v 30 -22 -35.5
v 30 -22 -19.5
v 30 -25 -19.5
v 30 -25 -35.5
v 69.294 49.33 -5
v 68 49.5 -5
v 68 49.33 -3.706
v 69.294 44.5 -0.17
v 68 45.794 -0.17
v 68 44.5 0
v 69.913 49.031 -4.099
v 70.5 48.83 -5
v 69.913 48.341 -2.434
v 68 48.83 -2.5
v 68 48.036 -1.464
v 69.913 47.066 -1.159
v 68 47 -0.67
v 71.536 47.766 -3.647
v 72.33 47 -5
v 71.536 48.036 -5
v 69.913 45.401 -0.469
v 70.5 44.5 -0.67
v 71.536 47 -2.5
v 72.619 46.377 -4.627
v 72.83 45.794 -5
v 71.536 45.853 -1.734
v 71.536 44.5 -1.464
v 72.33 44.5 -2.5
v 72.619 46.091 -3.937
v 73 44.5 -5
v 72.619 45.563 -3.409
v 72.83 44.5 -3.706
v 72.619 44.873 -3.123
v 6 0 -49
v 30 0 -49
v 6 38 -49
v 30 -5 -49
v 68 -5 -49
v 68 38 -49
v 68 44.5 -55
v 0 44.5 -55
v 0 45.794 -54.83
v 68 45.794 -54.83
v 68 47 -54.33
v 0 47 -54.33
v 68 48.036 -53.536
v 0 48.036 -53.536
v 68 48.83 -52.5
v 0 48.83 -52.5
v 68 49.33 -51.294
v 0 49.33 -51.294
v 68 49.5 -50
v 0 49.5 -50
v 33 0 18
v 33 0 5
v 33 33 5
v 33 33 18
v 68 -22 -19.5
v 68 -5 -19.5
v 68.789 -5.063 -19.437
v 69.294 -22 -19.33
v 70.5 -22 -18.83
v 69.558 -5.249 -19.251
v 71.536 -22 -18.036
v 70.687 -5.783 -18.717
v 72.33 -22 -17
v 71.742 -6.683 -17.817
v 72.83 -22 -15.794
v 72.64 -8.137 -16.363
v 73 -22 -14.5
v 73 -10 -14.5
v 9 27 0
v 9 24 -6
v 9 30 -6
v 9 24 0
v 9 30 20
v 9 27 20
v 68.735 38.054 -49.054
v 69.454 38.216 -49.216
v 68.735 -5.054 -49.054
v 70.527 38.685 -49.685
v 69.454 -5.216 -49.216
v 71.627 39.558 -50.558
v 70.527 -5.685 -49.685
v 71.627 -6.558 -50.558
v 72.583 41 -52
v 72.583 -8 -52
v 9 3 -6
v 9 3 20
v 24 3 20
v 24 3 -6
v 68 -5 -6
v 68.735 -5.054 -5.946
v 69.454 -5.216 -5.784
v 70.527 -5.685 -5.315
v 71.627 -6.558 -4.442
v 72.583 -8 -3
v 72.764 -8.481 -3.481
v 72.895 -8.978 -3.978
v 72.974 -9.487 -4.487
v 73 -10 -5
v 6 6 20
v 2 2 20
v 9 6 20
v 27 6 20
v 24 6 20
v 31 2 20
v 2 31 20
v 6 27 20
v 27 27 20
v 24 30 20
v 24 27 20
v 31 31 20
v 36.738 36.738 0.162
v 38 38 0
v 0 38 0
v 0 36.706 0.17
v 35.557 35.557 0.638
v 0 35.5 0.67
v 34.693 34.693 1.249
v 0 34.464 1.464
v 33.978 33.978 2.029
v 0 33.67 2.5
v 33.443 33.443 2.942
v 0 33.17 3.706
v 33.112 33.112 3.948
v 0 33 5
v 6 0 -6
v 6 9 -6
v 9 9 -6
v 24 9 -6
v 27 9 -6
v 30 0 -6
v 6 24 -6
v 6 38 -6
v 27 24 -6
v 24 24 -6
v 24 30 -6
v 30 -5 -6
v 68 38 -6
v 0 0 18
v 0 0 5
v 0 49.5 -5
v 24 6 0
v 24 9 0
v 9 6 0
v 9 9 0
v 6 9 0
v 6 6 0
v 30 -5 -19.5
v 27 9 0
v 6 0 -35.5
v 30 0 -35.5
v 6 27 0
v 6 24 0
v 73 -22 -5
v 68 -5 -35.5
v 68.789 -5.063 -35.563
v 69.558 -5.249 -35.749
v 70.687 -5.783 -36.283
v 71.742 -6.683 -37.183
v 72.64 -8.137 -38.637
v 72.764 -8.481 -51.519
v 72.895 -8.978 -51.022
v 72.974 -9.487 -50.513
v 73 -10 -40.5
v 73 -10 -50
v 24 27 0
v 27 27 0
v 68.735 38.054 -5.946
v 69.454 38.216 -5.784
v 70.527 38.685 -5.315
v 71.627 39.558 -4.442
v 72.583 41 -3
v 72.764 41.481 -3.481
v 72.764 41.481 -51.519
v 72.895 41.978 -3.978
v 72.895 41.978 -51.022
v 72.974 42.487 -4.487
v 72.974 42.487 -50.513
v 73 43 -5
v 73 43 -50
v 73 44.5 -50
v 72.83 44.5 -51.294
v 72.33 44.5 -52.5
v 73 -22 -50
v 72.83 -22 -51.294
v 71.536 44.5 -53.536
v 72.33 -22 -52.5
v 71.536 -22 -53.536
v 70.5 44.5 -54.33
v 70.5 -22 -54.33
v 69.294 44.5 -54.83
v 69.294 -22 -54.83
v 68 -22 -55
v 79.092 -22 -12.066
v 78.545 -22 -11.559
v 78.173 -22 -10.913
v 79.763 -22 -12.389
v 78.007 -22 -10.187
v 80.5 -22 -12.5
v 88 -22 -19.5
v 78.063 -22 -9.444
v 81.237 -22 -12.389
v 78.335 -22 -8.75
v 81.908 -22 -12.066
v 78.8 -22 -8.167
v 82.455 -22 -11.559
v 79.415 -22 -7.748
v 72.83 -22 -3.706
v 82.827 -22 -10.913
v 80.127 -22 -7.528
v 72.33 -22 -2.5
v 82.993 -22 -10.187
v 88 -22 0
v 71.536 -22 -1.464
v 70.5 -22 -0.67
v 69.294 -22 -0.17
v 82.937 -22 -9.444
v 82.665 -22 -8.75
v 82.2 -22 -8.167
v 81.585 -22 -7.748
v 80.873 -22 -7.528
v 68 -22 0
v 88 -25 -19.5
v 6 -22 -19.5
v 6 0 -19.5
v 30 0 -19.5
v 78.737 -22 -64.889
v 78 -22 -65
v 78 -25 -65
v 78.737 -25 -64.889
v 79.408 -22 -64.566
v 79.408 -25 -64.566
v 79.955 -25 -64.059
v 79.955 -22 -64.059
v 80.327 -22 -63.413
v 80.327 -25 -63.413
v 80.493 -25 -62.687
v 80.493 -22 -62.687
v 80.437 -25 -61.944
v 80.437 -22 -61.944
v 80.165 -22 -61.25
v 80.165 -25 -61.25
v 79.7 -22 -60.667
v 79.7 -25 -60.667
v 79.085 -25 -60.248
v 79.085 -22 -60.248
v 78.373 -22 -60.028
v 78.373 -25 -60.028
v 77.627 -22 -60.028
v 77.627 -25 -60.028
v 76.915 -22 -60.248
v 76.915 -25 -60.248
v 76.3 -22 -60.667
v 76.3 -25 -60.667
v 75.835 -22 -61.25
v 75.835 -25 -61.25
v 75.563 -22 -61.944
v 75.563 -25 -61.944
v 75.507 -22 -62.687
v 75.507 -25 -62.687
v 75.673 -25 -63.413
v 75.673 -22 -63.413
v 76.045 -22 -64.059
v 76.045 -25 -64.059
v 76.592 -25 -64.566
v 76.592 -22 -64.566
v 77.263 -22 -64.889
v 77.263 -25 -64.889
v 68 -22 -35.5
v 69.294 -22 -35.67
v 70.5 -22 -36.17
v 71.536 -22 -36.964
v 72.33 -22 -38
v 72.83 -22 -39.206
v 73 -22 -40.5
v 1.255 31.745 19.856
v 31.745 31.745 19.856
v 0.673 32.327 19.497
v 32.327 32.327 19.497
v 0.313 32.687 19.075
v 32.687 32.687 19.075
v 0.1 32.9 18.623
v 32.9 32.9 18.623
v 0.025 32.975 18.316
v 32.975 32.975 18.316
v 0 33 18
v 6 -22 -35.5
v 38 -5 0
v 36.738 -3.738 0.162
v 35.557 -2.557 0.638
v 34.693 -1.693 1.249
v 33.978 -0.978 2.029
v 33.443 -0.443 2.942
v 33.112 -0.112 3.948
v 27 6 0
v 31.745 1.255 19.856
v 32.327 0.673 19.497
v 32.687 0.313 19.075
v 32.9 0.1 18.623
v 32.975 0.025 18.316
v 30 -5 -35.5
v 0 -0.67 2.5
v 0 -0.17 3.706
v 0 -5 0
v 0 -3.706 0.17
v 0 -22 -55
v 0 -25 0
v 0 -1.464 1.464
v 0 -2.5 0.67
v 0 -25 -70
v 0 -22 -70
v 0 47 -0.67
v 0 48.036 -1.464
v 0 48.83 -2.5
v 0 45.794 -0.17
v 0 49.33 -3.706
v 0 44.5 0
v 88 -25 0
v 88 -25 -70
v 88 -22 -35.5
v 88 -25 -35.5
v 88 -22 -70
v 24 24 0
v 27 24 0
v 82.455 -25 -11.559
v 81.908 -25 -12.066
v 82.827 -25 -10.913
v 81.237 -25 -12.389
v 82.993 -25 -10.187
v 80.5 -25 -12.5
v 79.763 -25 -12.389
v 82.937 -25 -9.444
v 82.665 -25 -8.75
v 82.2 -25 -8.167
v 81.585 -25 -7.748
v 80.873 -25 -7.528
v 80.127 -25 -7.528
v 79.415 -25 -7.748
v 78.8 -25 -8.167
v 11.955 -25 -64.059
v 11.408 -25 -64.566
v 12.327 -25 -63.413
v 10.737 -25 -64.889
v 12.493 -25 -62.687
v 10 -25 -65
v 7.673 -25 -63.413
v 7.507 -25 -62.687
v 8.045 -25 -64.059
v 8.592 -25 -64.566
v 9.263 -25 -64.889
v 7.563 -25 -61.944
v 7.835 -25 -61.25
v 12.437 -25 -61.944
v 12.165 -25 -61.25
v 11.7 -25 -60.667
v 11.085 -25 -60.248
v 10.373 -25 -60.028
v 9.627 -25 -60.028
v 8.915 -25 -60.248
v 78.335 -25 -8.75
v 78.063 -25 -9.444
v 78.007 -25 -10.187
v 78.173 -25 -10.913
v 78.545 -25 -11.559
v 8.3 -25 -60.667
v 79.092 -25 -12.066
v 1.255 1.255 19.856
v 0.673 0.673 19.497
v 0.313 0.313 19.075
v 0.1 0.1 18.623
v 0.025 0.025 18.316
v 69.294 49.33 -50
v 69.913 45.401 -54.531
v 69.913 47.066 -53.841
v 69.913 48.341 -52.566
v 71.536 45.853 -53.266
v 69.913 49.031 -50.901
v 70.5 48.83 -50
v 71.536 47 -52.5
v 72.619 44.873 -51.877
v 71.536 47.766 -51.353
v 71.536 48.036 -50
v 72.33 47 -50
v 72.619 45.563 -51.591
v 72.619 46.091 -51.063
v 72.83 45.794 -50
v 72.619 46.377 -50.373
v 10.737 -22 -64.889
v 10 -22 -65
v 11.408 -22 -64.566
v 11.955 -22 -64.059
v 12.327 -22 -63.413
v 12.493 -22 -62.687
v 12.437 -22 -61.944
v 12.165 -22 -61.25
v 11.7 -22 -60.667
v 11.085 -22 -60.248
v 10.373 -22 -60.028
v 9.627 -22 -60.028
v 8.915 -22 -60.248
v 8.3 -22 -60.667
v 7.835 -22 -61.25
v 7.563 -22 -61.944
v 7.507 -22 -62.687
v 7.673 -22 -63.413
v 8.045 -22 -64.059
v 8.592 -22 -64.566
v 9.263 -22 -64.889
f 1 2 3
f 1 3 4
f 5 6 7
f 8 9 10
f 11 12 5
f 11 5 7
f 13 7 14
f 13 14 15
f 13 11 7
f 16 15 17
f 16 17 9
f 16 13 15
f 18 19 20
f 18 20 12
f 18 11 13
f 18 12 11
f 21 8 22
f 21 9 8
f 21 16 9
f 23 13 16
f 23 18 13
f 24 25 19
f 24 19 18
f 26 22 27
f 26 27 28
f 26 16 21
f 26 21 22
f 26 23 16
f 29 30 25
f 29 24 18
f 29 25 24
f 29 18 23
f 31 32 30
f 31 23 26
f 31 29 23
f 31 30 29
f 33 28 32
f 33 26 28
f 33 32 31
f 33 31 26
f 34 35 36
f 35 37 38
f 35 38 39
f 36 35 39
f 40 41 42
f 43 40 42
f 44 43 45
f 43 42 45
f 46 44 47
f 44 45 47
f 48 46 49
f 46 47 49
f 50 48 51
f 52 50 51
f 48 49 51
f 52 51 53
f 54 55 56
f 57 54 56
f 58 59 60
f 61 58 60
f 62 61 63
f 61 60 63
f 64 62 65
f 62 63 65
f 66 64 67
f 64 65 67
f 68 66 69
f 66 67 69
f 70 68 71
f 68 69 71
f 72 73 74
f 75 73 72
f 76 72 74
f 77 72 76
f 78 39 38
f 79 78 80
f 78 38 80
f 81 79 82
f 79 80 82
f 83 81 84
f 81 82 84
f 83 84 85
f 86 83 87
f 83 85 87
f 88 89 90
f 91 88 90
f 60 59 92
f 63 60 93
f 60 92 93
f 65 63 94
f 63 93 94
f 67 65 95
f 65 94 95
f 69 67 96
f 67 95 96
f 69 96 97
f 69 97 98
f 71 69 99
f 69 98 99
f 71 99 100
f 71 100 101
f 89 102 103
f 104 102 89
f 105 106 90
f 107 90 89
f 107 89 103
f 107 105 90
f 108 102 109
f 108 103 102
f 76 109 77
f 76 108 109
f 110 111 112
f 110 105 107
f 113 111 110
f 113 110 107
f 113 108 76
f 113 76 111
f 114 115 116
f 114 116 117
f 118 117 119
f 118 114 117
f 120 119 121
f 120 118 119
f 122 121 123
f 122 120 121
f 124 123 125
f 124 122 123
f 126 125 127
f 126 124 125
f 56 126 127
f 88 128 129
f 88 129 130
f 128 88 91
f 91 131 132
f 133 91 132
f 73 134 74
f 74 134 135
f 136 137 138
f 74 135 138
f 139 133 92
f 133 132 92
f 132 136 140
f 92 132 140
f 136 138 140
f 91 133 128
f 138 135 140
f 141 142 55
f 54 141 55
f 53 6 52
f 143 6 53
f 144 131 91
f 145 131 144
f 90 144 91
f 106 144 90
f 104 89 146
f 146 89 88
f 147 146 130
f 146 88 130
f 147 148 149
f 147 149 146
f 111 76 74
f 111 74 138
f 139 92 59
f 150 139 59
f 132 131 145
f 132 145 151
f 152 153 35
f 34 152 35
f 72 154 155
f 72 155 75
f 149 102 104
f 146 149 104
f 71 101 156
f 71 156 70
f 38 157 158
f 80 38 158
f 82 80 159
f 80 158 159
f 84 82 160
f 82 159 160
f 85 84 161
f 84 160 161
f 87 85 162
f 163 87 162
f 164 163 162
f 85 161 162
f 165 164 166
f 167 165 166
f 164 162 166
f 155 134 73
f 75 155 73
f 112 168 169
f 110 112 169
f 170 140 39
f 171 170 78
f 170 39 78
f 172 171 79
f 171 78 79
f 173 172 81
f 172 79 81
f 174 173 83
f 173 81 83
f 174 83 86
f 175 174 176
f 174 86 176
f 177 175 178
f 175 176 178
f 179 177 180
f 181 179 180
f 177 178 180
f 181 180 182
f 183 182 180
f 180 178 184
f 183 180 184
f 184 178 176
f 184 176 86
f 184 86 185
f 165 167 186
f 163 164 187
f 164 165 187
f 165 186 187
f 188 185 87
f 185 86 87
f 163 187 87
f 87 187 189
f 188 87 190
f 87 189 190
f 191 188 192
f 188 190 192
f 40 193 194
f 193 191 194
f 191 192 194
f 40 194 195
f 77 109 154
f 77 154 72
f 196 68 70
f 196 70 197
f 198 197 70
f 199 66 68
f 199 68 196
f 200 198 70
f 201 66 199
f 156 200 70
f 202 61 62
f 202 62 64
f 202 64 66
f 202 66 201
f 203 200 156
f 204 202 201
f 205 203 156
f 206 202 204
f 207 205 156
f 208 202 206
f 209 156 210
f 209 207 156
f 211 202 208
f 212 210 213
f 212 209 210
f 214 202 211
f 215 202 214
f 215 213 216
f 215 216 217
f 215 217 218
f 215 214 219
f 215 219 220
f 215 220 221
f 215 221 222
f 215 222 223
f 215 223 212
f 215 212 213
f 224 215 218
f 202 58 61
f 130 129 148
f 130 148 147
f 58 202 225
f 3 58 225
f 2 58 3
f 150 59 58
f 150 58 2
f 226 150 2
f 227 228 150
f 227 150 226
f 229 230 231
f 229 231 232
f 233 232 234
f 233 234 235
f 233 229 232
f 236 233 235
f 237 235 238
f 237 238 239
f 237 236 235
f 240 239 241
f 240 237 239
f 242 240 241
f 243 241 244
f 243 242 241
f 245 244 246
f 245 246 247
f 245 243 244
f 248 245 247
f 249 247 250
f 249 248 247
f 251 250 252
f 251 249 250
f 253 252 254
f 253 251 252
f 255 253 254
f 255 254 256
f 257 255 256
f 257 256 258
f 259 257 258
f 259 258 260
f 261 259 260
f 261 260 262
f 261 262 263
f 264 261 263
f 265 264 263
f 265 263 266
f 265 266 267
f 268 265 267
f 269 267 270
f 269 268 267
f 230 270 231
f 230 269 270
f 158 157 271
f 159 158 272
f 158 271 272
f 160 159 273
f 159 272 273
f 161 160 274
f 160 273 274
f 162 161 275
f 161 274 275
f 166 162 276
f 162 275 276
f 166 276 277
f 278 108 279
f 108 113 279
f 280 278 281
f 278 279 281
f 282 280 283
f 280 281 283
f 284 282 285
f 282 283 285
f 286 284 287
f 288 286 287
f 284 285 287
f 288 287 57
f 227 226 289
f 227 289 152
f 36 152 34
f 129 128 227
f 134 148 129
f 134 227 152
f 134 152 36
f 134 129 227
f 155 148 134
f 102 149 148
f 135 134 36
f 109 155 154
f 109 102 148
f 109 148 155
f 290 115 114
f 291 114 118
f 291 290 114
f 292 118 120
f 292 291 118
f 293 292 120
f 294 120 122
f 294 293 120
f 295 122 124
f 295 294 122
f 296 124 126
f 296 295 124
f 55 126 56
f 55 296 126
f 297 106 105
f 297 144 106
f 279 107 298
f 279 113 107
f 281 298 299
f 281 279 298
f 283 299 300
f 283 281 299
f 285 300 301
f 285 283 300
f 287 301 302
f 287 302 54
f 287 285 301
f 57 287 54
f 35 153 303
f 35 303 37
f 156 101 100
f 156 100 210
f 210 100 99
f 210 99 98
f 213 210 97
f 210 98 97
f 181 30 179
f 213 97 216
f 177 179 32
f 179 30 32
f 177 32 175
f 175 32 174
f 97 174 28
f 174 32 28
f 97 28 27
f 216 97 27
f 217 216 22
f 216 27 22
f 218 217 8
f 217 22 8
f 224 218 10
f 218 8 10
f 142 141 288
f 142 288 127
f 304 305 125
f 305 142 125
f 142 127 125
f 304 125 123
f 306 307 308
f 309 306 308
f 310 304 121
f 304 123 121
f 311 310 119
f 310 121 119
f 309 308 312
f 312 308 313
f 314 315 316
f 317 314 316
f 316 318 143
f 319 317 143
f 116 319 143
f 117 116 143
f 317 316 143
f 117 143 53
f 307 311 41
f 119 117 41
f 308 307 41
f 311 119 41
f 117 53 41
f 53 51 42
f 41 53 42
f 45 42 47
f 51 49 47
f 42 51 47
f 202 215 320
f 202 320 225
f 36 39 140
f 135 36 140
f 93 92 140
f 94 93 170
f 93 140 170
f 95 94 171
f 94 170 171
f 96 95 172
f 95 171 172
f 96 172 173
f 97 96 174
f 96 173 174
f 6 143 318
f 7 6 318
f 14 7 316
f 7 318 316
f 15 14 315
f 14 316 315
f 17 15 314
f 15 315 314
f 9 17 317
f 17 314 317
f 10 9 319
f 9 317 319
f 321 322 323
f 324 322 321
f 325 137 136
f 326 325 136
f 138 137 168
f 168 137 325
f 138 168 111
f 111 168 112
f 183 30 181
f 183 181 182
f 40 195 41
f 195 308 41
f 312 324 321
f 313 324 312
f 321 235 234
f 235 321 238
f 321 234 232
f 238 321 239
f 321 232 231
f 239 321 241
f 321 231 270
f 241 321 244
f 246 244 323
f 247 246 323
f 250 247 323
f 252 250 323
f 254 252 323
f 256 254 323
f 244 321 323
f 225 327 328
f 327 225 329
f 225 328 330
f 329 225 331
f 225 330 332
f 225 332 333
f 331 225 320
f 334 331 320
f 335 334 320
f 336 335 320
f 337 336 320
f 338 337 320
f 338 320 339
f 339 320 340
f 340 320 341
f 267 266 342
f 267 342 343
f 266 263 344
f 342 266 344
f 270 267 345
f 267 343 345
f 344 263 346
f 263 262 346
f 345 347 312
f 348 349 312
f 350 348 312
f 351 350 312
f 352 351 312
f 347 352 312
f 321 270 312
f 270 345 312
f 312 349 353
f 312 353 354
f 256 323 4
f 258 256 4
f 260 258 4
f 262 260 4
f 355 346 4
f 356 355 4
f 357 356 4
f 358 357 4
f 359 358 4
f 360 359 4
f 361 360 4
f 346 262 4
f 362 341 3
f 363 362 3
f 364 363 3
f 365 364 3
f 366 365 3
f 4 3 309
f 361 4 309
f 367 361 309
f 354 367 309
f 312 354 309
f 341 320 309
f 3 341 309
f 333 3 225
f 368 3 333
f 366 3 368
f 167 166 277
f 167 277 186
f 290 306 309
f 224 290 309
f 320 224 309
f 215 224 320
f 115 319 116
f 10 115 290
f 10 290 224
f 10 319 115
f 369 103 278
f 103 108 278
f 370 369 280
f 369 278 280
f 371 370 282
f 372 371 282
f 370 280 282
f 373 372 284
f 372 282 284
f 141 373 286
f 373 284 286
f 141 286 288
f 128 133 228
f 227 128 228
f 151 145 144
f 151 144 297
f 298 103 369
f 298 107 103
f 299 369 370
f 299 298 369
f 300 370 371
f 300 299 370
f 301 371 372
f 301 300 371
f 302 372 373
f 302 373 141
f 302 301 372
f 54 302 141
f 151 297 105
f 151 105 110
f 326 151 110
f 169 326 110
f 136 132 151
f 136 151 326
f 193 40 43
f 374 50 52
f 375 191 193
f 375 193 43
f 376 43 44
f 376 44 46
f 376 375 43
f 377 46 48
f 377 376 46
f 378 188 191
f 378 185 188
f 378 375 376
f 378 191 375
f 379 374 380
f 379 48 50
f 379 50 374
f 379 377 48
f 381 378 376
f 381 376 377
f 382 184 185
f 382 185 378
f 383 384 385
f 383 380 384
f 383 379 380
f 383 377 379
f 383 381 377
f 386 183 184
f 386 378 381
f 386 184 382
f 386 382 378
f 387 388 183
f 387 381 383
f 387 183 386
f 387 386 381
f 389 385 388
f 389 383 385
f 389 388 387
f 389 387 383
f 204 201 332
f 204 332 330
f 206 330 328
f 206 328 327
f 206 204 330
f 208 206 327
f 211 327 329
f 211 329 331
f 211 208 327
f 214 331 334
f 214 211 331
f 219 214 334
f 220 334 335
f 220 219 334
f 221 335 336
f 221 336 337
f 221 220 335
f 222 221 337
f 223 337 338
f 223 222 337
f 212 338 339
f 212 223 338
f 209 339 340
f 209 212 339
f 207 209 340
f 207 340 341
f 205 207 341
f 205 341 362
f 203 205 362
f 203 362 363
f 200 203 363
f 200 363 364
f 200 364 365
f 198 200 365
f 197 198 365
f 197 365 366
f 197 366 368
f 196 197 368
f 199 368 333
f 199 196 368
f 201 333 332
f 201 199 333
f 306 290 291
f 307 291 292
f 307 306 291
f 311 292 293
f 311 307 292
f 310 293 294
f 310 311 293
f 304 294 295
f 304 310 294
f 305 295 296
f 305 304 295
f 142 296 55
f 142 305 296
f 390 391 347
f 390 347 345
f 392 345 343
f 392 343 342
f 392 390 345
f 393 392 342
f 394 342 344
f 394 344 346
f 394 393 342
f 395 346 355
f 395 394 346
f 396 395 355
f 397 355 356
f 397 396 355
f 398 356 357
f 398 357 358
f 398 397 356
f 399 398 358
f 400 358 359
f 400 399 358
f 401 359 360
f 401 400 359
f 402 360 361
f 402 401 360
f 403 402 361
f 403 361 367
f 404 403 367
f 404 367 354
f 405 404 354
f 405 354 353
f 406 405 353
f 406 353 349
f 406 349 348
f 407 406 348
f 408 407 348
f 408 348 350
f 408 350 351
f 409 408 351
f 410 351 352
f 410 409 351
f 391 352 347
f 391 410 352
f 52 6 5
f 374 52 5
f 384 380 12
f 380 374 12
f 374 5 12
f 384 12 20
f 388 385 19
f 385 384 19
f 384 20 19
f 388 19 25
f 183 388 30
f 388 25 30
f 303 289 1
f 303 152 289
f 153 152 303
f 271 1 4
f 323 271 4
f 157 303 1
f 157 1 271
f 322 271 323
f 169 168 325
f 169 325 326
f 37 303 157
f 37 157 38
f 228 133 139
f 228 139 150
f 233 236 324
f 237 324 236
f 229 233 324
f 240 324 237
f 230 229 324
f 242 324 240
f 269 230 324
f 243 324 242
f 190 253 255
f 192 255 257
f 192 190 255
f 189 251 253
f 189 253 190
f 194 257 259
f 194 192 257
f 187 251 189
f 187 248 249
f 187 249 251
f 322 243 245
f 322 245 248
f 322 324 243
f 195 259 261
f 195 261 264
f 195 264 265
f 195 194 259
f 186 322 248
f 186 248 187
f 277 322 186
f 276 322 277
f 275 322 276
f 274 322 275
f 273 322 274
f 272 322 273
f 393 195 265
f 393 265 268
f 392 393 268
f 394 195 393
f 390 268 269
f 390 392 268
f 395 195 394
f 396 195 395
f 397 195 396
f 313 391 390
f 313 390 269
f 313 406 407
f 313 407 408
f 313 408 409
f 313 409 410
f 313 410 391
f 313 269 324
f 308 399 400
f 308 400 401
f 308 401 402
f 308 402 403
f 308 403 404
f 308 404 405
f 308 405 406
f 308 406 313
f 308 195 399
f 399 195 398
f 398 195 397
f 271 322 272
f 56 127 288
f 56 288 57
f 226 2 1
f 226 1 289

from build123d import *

# Parameters (mm, degrees)
SKETCH1_W           = 33
SKETCH1_H           = 33
BOSS_EXTRUDE1_DEPTH = 20
SHELL1_T            = -6
SKETCH2_W           = 73
SKETCH2_H           = 71.5
BOSS_EXTRUDE2_DEPTH = 55
SKETCH7_W           = 15
SKETCH7_H           = 50
CUT_EXTRUDE2_DEPTH  = 3
SKETCH9_W           = 21
SKETCH9_H           = 21
CUT_EXTRUDE5_DEPTH  = 45
SKETCH16_W          = 55
SKETCH16_H          = 55
BOSS_EXTRUDE5_DEPTH = 40
CUT_EXTRUDE14_REACH = 105.943
BOSS_EXTRUDE6_START = -26
SKETCH23_W          = 3
SKETCH23_H          = 3
BOSS_EXTRUDE6_DEPTH = 6
BOSS_EXTRUDE7_REACH = 148.943
BOSS_EXTRUDE7_START = -43
SKETCH24_W          = 13.5
SKETCH24_H          = 5
SKETCH25_R          = 2.5
BOSS_EXTRUDE8_DEPTH = 3
FILLET1_R           = 5
FILLET2_R           = 2


with BuildPart() as part:
    # Sketch1 → Boss-Extrude1 (new body)
    with BuildSketch(Plane.XY):
        with Locations((16.5, 16.5)):
            Rectangle(SKETCH1_W, SKETCH1_H)
    extrude(amount=BOSS_EXTRUDE1_DEPTH)

    # Shell1
    shell1_openings = [part.faces().sort_by_distance(p)[0] for p in [
        (16.5, 16.5, 20),
    ]]
    offset(amount=SHELL1_T, openings=shell1_openings, kind=Kind.INTERSECTION)

    # Sketch2 → Boss-Extrude2 (add)
    with BuildSketch(Plane(origin=(0, 0, 0), x_dir=(-1, 0, 0), z_dir=(0, 0, -1))):
        with Locations((-36.5, 13.75)):
            Rectangle(SKETCH2_W, SKETCH2_H)
    extrude(amount=BOSS_EXTRUDE2_DEPTH)

    # Sketch7 → Cut-Extrude2 (cut)
    with BuildSketch(Plane.XZ.offset(-27)):
        with Locations((16.5, -5)):
            Rectangle(SKETCH7_W, SKETCH7_H)
    cut_extrude2 = extrude(amount=-CUT_EXTRUDE2_DEPTH, mode=Mode.SUBTRACT)

    # Sketch9 → Cut-Extrude5 (cut)
    with BuildSketch(Plane.XY.offset(6)):
        with Locations((16.5, 16.5)):
            Rectangle(SKETCH9_W, SKETCH9_H)
    extrude(amount=-CUT_EXTRUDE5_DEPTH, mode=Mode.SUBTRACT)

    # Mirror2: Cut-Extrude2 across plane
    add(cut_extrude2.mirror(Plane(origin=(0, 16.5, 0), x_dir=(0, 0, 1), z_dir=(0, -1, 0))), mode=Mode.SUBTRACT)

    # Sketch16 → Boss-Extrude5 (add)
    with BuildSketch(Plane(origin=(33, 0, 0), x_dir=(0, 0, -1), z_dir=(1, 0, 0))):
        with Locations((27.5, 16.5)):
            Rectangle(SKETCH16_W, SKETCH16_H)
    extrude(amount=BOSS_EXTRUDE5_DEPTH)

    # Cut-Extrude14: up to this face of the body (flat: up to its plane)
    cut_extrude14_end = Plane(part.part.faces().sort_by_distance((6, 16.5, -9.5))[0])
    # Sketch22 → Cut-Extrude14 (cut, up to the picked face)
    with BuildSketch(Plane(origin=(73, 0, 0), x_dir=(0, 0, -1), z_dir=(1, 0, 0)), mode=Mode.PRIVATE) as cut_extrude14_sk1:
        Polygon((6, -5), (19.5, -5), (19.5, -22), (35.5, -22), (35.5, -5), (49, -5), (49, 38), (6, 38), align=None)
    cut_extrude14_tool1 = split(extrude(cut_extrude14_sk1.sketch, amount=-CUT_EXTRUDE14_REACH, mode=Mode.PRIVATE), bisect_by=cut_extrude14_end, keep=Keep.BOTH, mode=Mode.PRIVATE)
    add(cut_extrude14_tool1.solids().sort_by(Axis((73, 12.652758, -27.5), (-1, 0, 0)))[0], mode=Mode.SUBTRACT)

    # Sketch23 → Boss-Extrude6 (add)
    with BuildSketch(Plane.XY.offset(20).offset(BOSS_EXTRUDE6_START)):
        with Locations((7.5, 7.5)):
            Rectangle(SKETCH23_W, SKETCH23_H)
        with Locations((7.5, 25.5)):
            Rectangle(SKETCH23_W, SKETCH23_H)
        with Locations((25.5, 25.5)):
            Rectangle(SKETCH23_W, SKETCH23_H)
        with Locations((25.5, 7.5)):
            Rectangle(SKETCH23_W, SKETCH23_H)
    extrude(amount=BOSS_EXTRUDE6_DEPTH)

    # Sketch24 → Boss-Extrude7 (add, up to next)
    with BuildSketch(Plane(origin=(73, 0, 0), x_dir=(0, 0, -1), z_dir=(1, 0, 0)).offset(BOSS_EXTRUDE7_START), mode=Mode.PRIVATE) as boss_extrude7_sk1:
        with Locations((12.75, -2.5)):
            Rectangle(SKETCH24_W, SKETCH24_H)
    boss_extrude7_tool1 = extrude(boss_extrude7_sk1.sketch, amount=-BOSS_EXTRUDE7_REACH, mode=Mode.PRIVATE) - part.part
    # Sketch24 → Boss-Extrude7 (add, up to next)
    with BuildSketch(Plane(origin=(73, 0, 0), x_dir=(0, 0, -1), z_dir=(1, 0, 0)).offset(BOSS_EXTRUDE7_START), mode=Mode.PRIVATE) as boss_extrude7_sk2:
        with Locations((42.25, -2.5)):
            Rectangle(SKETCH24_W, SKETCH24_H)
    boss_extrude7_tool2 = extrude(boss_extrude7_sk2.sketch, amount=-BOSS_EXTRUDE7_REACH, mode=Mode.PRIVATE) - part.part
    add(boss_extrude7_tool1.solids().sort_by_distance((30, -2.5, -12.75))[0])
    add(boss_extrude7_tool2.solids().sort_by_distance((30, -2.5, -42.25))[0])

    # Sketch25 → Boss-Extrude8 (add)
    with BuildSketch(Plane.XZ.offset(22)):
        Polygon((0, 0), (88, 0), (88, -19.5), (30, -19.5), (30, -35.5), (88, -35.5), (88, -70), (0, -70), align=None)
        with Locations(Location((10, -62.5, 0), (0, 0, 270))):
            Circle(SKETCH25_R, mode=Mode.SUBTRACT)
        with Locations(Location((78, -62.5, 0), (0, 0, 270))):
            Circle(SKETCH25_R, mode=Mode.SUBTRACT)
        with Locations(Location((80.5, -10, 0), (0, 0, 270))):
            Circle(SKETCH25_R, mode=Mode.SUBTRACT)
    extrude(amount=BOSS_EXTRUDE8_DEPTH)

    # Fillet1
    # the kernel refuses this fillet: 5 mm, written as the material it adds along each edge
    with BuildSketch(Plane(origin=(33, 33, 0), x_dir=(0, 0, 1), z_dir=(-1, 0, 0)), Plane(origin=(33, 0, 0), x_dir=(0, 0, 1), z_dir=(0, 1, 0)), Plane(origin=(0, 0, 0), x_dir=(0, 0, 1), z_dir=(1, 0, 0))) as fillet1_piece_1:
        with BuildLine():
            CenterArc((FILLET1_R, FILLET1_R), FILLET1_R, 180, 90)
            Line((0, FILLET1_R), (-FILLET1_R * 0.02, FILLET1_R))
            Line((-FILLET1_R * 0.02, FILLET1_R), (-FILLET1_R * 0.02, -FILLET1_R * 0.02))
            Line((-FILLET1_R * 0.02, -FILLET1_R * 0.02), (FILLET1_R, -FILLET1_R * 0.02))
            Line((FILLET1_R, -FILLET1_R * 0.02), (FILLET1_R, 0))
        make_face()
    extrude(amount=33)
    with BuildSketch(Plane(origin=(33, 0, 0), x_dir=(0, 0, 1), z_dir=(0, 1, 0))) as fillet1_piece_2a_section:
        with BuildLine():
            CenterArc((FILLET1_R, FILLET1_R), FILLET1_R, 180, 90)
            Line((0, FILLET1_R), (-FILLET1_R * 0.02, FILLET1_R))
            Line((-FILLET1_R * 0.02, FILLET1_R), (-FILLET1_R * 0.02, -FILLET1_R * 0.02))
            Line((-FILLET1_R * 0.02, -FILLET1_R * 0.02), (FILLET1_R, -FILLET1_R * 0.02))
            Line((FILLET1_R, -FILLET1_R * 0.02), (FILLET1_R, 0))
        make_face()
    fillet1_piece_2a = extrude(amount=45.5, mode=Mode.PRIVATE)
    fillet1_piece_2a = split(fillet1_piece_2a, bisect_by=Plane(origin=(34.131975571, 33, 1.131975571), z_dir=(0, 1, 0)), keep=Keep.TOP, mode=Mode.PRIVATE)
    with BuildSketch(Plane(origin=(45.5, 33, 0), x_dir=(0, 0, 1), z_dir=(-1, 0, 0))) as fillet1_piece_2b_section:
        with BuildLine():
            CenterArc((FILLET1_R, FILLET1_R), FILLET1_R, 180, 90)
            Line((0, FILLET1_R), (-FILLET1_R * 0.02, FILLET1_R))
            Line((-FILLET1_R * 0.02, FILLET1_R), (-FILLET1_R * 0.02, -FILLET1_R * 0.02))
            Line((-FILLET1_R * 0.02, -FILLET1_R * 0.02), (FILLET1_R, -FILLET1_R * 0.02))
            Line((FILLET1_R, -FILLET1_R * 0.02), (FILLET1_R, 0))
        make_face()
    fillet1_piece_2b = extrude(amount=45.5, mode=Mode.PRIVATE)
    fillet1_piece_2b = split(fillet1_piece_2b, bisect_by=Plane(origin=(33, 34.131975571, 1.131975571), z_dir=(1, 0, 0)), keep=Keep.TOP, mode=Mode.PRIVATE)
    fillet1_piece_2 = fillet1_piece_2a & fillet1_piece_2b
    add(fillet1_piece_2)
    with BuildSketch(Plane(origin=(0, 0, 0), x_dir=(0, 0, 1), z_dir=(1, 0, 0))) as fillet1_piece_3a_section:
        with BuildLine():
            CenterArc((FILLET1_R, FILLET1_R), FILLET1_R, 180, 90)
            Line((0, FILLET1_R), (-FILLET1_R * 0.02, FILLET1_R))
            Line((-FILLET1_R * 0.02, FILLET1_R), (-FILLET1_R * 0.02, -FILLET1_R * 0.02))
            Line((-FILLET1_R * 0.02, -FILLET1_R * 0.02), (FILLET1_R, -FILLET1_R * 0.02))
            Line((FILLET1_R, -FILLET1_R * 0.02), (FILLET1_R, 0))
        make_face()
    fillet1_piece_3a = extrude(amount=45.5, mode=Mode.PRIVATE)
    fillet1_piece_3a = split(fillet1_piece_3a, bisect_by=Plane(origin=(33, -1.131975571, 1.131975571), z_dir=(1, 0, 0)), keep=Keep.TOP, mode=Mode.PRIVATE)
    with BuildSketch(Plane(origin=(33, -12.5, 0), x_dir=(0, 0, 1), z_dir=(0, 1, 0))) as fillet1_piece_3b_section:
        with BuildLine():
            CenterArc((FILLET1_R, FILLET1_R), FILLET1_R, 180, 90)
            Line((0, FILLET1_R), (-FILLET1_R * 0.02, FILLET1_R))
            Line((-FILLET1_R * 0.02, FILLET1_R), (-FILLET1_R * 0.02, -FILLET1_R * 0.02))
            Line((-FILLET1_R * 0.02, -FILLET1_R * 0.02), (FILLET1_R, -FILLET1_R * 0.02))
            Line((FILLET1_R, -FILLET1_R * 0.02), (FILLET1_R, 0))
        make_face()
    fillet1_piece_3b = extrude(amount=45.5, mode=Mode.PRIVATE)
    fillet1_piece_3b = split(fillet1_piece_3b, bisect_by=Plane(origin=(34.131975571, 0, 1.131975571), z_dir=(0, -1, 0)), keep=Keep.TOP, mode=Mode.PRIVATE)
    fillet1_piece_3 = fillet1_piece_3a & fillet1_piece_3b
    add(fillet1_piece_3)
    # the kernel refuses this fillet: 5 mm, written as the material it takes off along each edge
    with BuildSketch(Plane(origin=(68, 44.5, -50), x_dir=(0, 1, 0), z_dir=(1, 0, 0))) as fillet1_2_piece_1_section:
        Polygon((0, 0), (FILLET1_R * 1.02, 0), (FILLET1_R * 1.02, -FILLET1_R * 1.02), (0, -FILLET1_R * 1.02), align=None)
    fillet1_2_piece_1 = extrude(amount=FILLET1_R * 1.02, mode=Mode.PRIVATE)
    fillet1_2_piece_1 = fillet1_2_piece_1 - Plane(origin=(68, 44.5, -50), x_dir=(0, -0.7071067811865475, 0.7071067811865475), z_dir=(1, 0, 0)) * Sphere(FILLET1_R, mode=Mode.PRIVATE)
    add(fillet1_2_piece_1, mode=Mode.SUBTRACT)
    with BuildSketch(Plane(origin=(68, 44.5, -5), x_dir=(0, 1, 0), z_dir=(1, 0, 0))) as fillet1_2_piece_2_section:
        Polygon((0, 0), (FILLET1_R * 1.02, 0), (FILLET1_R * 1.02, FILLET1_R * 1.02), (0, FILLET1_R * 1.02), align=None)
    fillet1_2_piece_2 = extrude(amount=FILLET1_R * 1.02, mode=Mode.PRIVATE)
    fillet1_2_piece_2 = fillet1_2_piece_2 - Plane(origin=(68, 44.5, -5), x_dir=(0, -0.7071067811865475, -0.7071067811865475), z_dir=(1, 0, 0)) * Sphere(FILLET1_R, mode=Mode.PRIVATE)
    add(fillet1_2_piece_2, mode=Mode.SUBTRACT)
    with BuildSketch(Plane(origin=(73, -5, -49), x_dir=(0, 0, -1), z_dir=(0, 1, 0)), Plane(origin=(73, 38, -49), x_dir=(0, 1, 0), z_dir=(0, 0, 1)), Plane(origin=(73, 38, -6), x_dir=(0, 0, 1), z_dir=(0, -1, 0))) as fillet1_2_piece_3:
        with BuildLine():
            CenterArc((FILLET1_R, FILLET1_R), FILLET1_R, 180, 90)
            Line((0, FILLET1_R), (-FILLET1_R * 0.02, FILLET1_R))
            Line((-FILLET1_R * 0.02, FILLET1_R), (-FILLET1_R * 0.02, -FILLET1_R * 0.02))
            Line((-FILLET1_R * 0.02, -FILLET1_R * 0.02), (FILLET1_R, -FILLET1_R * 0.02))
            Line((FILLET1_R, -FILLET1_R * 0.02), (FILLET1_R, 0))
        make_face()
    extrude(amount=43, mode=Mode.SUBTRACT)
    with BuildSketch(Plane(origin=(73, -5, -6), x_dir=(0, -1, 0), z_dir=(0, 0, -1)), Plane(origin=(73, -5, -35.5), x_dir=(0, -1, 0), z_dir=(0, 0, -1))) as fillet1_2_piece_4:
        with BuildLine():
            CenterArc((FILLET1_R, FILLET1_R), FILLET1_R, 180, 90)
            Line((0, FILLET1_R), (-FILLET1_R * 0.02, FILLET1_R))
            Line((-FILLET1_R * 0.02, FILLET1_R), (-FILLET1_R * 0.02, -FILLET1_R * 0.02))
            Line((-FILLET1_R * 0.02, -FILLET1_R * 0.02), (FILLET1_R, -FILLET1_R * 0.02))
            Line((FILLET1_R, -FILLET1_R * 0.02), (FILLET1_R, 0))
        make_face()
    extrude(amount=13.5, mode=Mode.SUBTRACT)
    with BuildSketch(Plane(origin=(73, -5, -19.5), x_dir=(0, 0, 1), z_dir=(0, -1, 0)), Plane(origin=(73, -22, -35.5), x_dir=(0, 0, -1), z_dir=(0, 1, 0))) as fillet1_2_piece_5:
        with BuildLine():
            CenterArc((FILLET1_R, FILLET1_R), FILLET1_R, 180, 90)
            Line((0, FILLET1_R), (-FILLET1_R * 0.02, FILLET1_R))
            Line((-FILLET1_R * 0.02, FILLET1_R), (-FILLET1_R * 0.02, -FILLET1_R * 0.02))
            Line((-FILLET1_R * 0.02, -FILLET1_R * 0.02), (FILLET1_R, -FILLET1_R * 0.02))
            Line((FILLET1_R, -FILLET1_R * 0.02), (FILLET1_R, 0))
        make_face()
    extrude(amount=17, mode=Mode.SUBTRACT)
    with BuildSketch(Plane(origin=(0, 49.5, -55), x_dir=(0, 0, 1), z_dir=(1, 0, 0))) as fillet1_2_piece_6:
        with BuildLine():
            CenterArc((FILLET1_R, FILLET1_R), FILLET1_R, 180, 90)
            Line((0, FILLET1_R), (-FILLET1_R * 0.02, FILLET1_R))
            Line((-FILLET1_R * 0.02, FILLET1_R), (-FILLET1_R * 0.02, -FILLET1_R * 0.02))
            Line((-FILLET1_R * 0.02, -FILLET1_R * 0.02), (FILLET1_R, -FILLET1_R * 0.02))
            Line((FILLET1_R, -FILLET1_R * 0.02), (FILLET1_R, 0))
        make_face()
    extrude(amount=68, mode=Mode.SUBTRACT)
    with BuildSketch(Plane(origin=(73, -22, -55), x_dir=(0, 0, 1), z_dir=(0, 1, 0)), Plane(origin=(73, 44.5, 0), x_dir=(0, 0, -1), z_dir=(0, -1, 0))) as fillet1_2_piece_7:
        with BuildLine():
            CenterArc((FILLET1_R, -FILLET1_R), FILLET1_R, 90, 90)
            Line((0, -FILLET1_R), (-FILLET1_R * 0.02, -FILLET1_R))
            Line((-FILLET1_R * 0.02, -FILLET1_R), (-FILLET1_R * 0.02, FILLET1_R * 0.02))
            Line((-FILLET1_R * 0.02, FILLET1_R * 0.02), (FILLET1_R, FILLET1_R * 0.02))
            Line((FILLET1_R, FILLET1_R * 0.02), (FILLET1_R, 0))
        make_face()
    extrude(amount=66.5, mode=Mode.SUBTRACT)
    with BuildSketch(Plane(origin=(73, 49.5, -5), x_dir=(0, -1, 0), z_dir=(0, 0, -1))) as fillet1_2_piece_8:
        with BuildLine():
            CenterArc((FILLET1_R, FILLET1_R), FILLET1_R, 180, 90)
            Line((0, FILLET1_R), (-FILLET1_R * 0.02, FILLET1_R))
            Line((-FILLET1_R * 0.02, FILLET1_R), (-FILLET1_R * 0.02, -FILLET1_R * 0.02))
            Line((-FILLET1_R * 0.02, -FILLET1_R * 0.02), (FILLET1_R, -FILLET1_R * 0.02))
            Line((FILLET1_R, -FILLET1_R * 0.02), (FILLET1_R, 0))
        make_face()
    extrude(amount=45, mode=Mode.SUBTRACT)
    with BuildSketch(Plane(origin=(0, 49.5, 0), x_dir=(0, 0, -1), z_dir=(1, 0, 0))) as fillet1_2_piece_9:
        with BuildLine():
            CenterArc((FILLET1_R, -FILLET1_R), FILLET1_R, 90, 90)
            Line((0, -FILLET1_R), (-FILLET1_R * 0.02, -FILLET1_R))
            Line((-FILLET1_R * 0.02, -FILLET1_R), (-FILLET1_R * 0.02, FILLET1_R * 0.02))
            Line((-FILLET1_R * 0.02, FILLET1_R * 0.02), (FILLET1_R, FILLET1_R * 0.02))
            Line((FILLET1_R, FILLET1_R * 0.02), (FILLET1_R, 0))
        make_face()
    extrude(amount=68, mode=Mode.SUBTRACT)
    with BuildSketch(Plane(origin=(73, -17.5, -49), x_dir=(0, 0, -1), z_dir=(0, 1, 0))) as fillet1_2_piece_10a_section:
        with BuildLine():
            CenterArc((FILLET1_R, FILLET1_R), FILLET1_R, 180, 90)
            Line((0, FILLET1_R), (-FILLET1_R * 0.02, FILLET1_R))
            Line((-FILLET1_R * 0.02, FILLET1_R), (-FILLET1_R * 0.02, -FILLET1_R * 0.02))
            Line((-FILLET1_R * 0.02, -FILLET1_R * 0.02), (FILLET1_R, -FILLET1_R * 0.02))
            Line((FILLET1_R, -FILLET1_R * 0.02), (FILLET1_R, 0))
        make_face()
    fillet1_2_piece_10a = extrude(amount=55.5, mode=Mode.PRIVATE)
    fillet1_2_piece_10a = split(fillet1_2_piece_10a, bisect_by=Plane(origin=(71.868024429, -5, -50.131975571), z_dir=(0, -1, 0)), keep=Keep.TOP, mode=Mode.PRIVATE)
    with BuildSketch(Plane(origin=(73, -5, -35.5), x_dir=(0, -1, 0), z_dir=(0, 0, -1))) as fillet1_2_piece_10b_section:
        with BuildLine():
            CenterArc((FILLET1_R, FILLET1_R), FILLET1_R, 180, 90)
            Line((0, FILLET1_R), (-FILLET1_R * 0.02, FILLET1_R))
            Line((-FILLET1_R * 0.02, FILLET1_R), (-FILLET1_R * 0.02, -FILLET1_R * 0.02))
            Line((-FILLET1_R * 0.02, -FILLET1_R * 0.02), (FILLET1_R, -FILLET1_R * 0.02))
            Line((FILLET1_R, -FILLET1_R * 0.02), (FILLET1_R, 0))
        make_face()
    fillet1_2_piece_10b = extrude(amount=26, mode=Mode.PRIVATE)
    fillet1_2_piece_10b = split(fillet1_2_piece_10b, bisect_by=Plane(origin=(71.868024429, -6.131975571, -49), z_dir=(0, 0, -1)), keep=Keep.TOP, mode=Mode.PRIVATE)
    fillet1_2_piece_10 = fillet1_2_piece_10a & fillet1_2_piece_10b
    add(fillet1_2_piece_10, mode=Mode.SUBTRACT)
    with BuildSketch(Plane(origin=(73, 38, -61.5), x_dir=(0, 1, 0), z_dir=(0, 0, 1))) as fillet1_2_piece_11a_section:
        with BuildLine():
            CenterArc((FILLET1_R, FILLET1_R), FILLET1_R, 180, 90)
            Line((0, FILLET1_R), (-FILLET1_R * 0.02, FILLET1_R))
            Line((-FILLET1_R * 0.02, FILLET1_R), (-FILLET1_R * 0.02, -FILLET1_R * 0.02))
            Line((-FILLET1_R * 0.02, -FILLET1_R * 0.02), (FILLET1_R, -FILLET1_R * 0.02))
            Line((FILLET1_R, -FILLET1_R * 0.02), (FILLET1_R, 0))
        make_face()
    fillet1_2_piece_11a = extrude(amount=55.5, mode=Mode.PRIVATE)
    fillet1_2_piece_11a = split(fillet1_2_piece_11a, bisect_by=Plane(origin=(71.868024429, 39.131975571, -49), z_dir=(0, 0, -1)), keep=Keep.TOP, mode=Mode.PRIVATE)
    with BuildSketch(Plane(origin=(73, -5, -49), x_dir=(0, 0, -1), z_dir=(0, 1, 0))) as fillet1_2_piece_11b_section:
        with BuildLine():
            CenterArc((FILLET1_R, FILLET1_R), FILLET1_R, 180, 90)
            Line((0, FILLET1_R), (-FILLET1_R * 0.02, FILLET1_R))
            Line((-FILLET1_R * 0.02, FILLET1_R), (-FILLET1_R * 0.02, -FILLET1_R * 0.02))
            Line((-FILLET1_R * 0.02, -FILLET1_R * 0.02), (FILLET1_R, -FILLET1_R * 0.02))
            Line((FILLET1_R, -FILLET1_R * 0.02), (FILLET1_R, 0))
        make_face()
    fillet1_2_piece_11b = extrude(amount=55.5, mode=Mode.PRIVATE)
    fillet1_2_piece_11b = split(fillet1_2_piece_11b, bisect_by=Plane(origin=(71.868024429, 38, -50.131975571), z_dir=(0, 1, 0)), keep=Keep.TOP, mode=Mode.PRIVATE)
    fillet1_2_piece_11 = fillet1_2_piece_11a & fillet1_2_piece_11b
    add(fillet1_2_piece_11, mode=Mode.SUBTRACT)
    with BuildSketch(Plane(origin=(73, 50.5, -6), x_dir=(0, 0, 1), z_dir=(0, -1, 0))) as fillet1_2_piece_12a_section:
        with BuildLine():
            CenterArc((FILLET1_R, FILLET1_R), FILLET1_R, 180, 90)
            Line((0, FILLET1_R), (-FILLET1_R * 0.02, FILLET1_R))
            Line((-FILLET1_R * 0.02, FILLET1_R), (-FILLET1_R * 0.02, -FILLET1_R * 0.02))
            Line((-FILLET1_R * 0.02, -FILLET1_R * 0.02), (FILLET1_R, -FILLET1_R * 0.02))
            Line((FILLET1_R, -FILLET1_R * 0.02), (FILLET1_R, 0))
        make_face()
    fillet1_2_piece_12a = extrude(amount=55.5, mode=Mode.PRIVATE)
    fillet1_2_piece_12a = split(fillet1_2_piece_12a, bisect_by=Plane(origin=(71.868024429, 38, -4.868024429), z_dir=(0, 1, 0)), keep=Keep.TOP, mode=Mode.PRIVATE)
    with BuildSketch(Plane(origin=(73, 38, -49), x_dir=(0, 1, 0), z_dir=(0, 0, 1))) as fillet1_2_piece_12b_section:
        with BuildLine():
            CenterArc((FILLET1_R, FILLET1_R), FILLET1_R, 180, 90)
            Line((0, FILLET1_R), (-FILLET1_R * 0.02, FILLET1_R))
            Line((-FILLET1_R * 0.02, FILLET1_R), (-FILLET1_R * 0.02, -FILLET1_R * 0.02))
            Line((-FILLET1_R * 0.02, -FILLET1_R * 0.02), (FILLET1_R, -FILLET1_R * 0.02))
            Line((FILLET1_R, -FILLET1_R * 0.02), (FILLET1_R, 0))
        make_face()
    fillet1_2_piece_12b = extrude(amount=55.5, mode=Mode.PRIVATE)
    fillet1_2_piece_12b = split(fillet1_2_piece_12b, bisect_by=Plane(origin=(71.868024429, 39.131975571, -6), z_dir=(0, 0, 1)), keep=Keep.TOP, mode=Mode.PRIVATE)
    fillet1_2_piece_12 = fillet1_2_piece_12a & fillet1_2_piece_12b
    add(fillet1_2_piece_12, mode=Mode.SUBTRACT)
    with BuildSketch(Plane(origin=(73, -5, 6.5), x_dir=(0, -1, 0), z_dir=(0, 0, -1))) as fillet1_2_piece_13a_section:
        with BuildLine():
            CenterArc((FILLET1_R, FILLET1_R), FILLET1_R, 180, 90)
            Line((0, FILLET1_R), (-FILLET1_R * 0.02, FILLET1_R))
            Line((-FILLET1_R * 0.02, FILLET1_R), (-FILLET1_R * 0.02, -FILLET1_R * 0.02))
            Line((-FILLET1_R * 0.02, -FILLET1_R * 0.02), (FILLET1_R, -FILLET1_R * 0.02))
            Line((FILLET1_R, -FILLET1_R * 0.02), (FILLET1_R, 0))
        make_face()
    fillet1_2_piece_13a = extrude(amount=26, mode=Mode.PRIVATE)
    fillet1_2_piece_13a = split(fillet1_2_piece_13a, bisect_by=Plane(origin=(71.868024429, -6.131975571, -6), z_dir=(0, 0, 1)), keep=Keep.TOP, mode=Mode.PRIVATE)
    with BuildSketch(Plane(origin=(73, 38, -6), x_dir=(0, 0, 1), z_dir=(0, -1, 0))) as fillet1_2_piece_13b_section:
        with BuildLine():
            CenterArc((FILLET1_R, FILLET1_R), FILLET1_R, 180, 90)
            Line((0, FILLET1_R), (-FILLET1_R * 0.02, FILLET1_R))
            Line((-FILLET1_R * 0.02, FILLET1_R), (-FILLET1_R * 0.02, -FILLET1_R * 0.02))
            Line((-FILLET1_R * 0.02, -FILLET1_R * 0.02), (FILLET1_R, -FILLET1_R * 0.02))
            Line((FILLET1_R, -FILLET1_R * 0.02), (FILLET1_R, 0))
        make_face()
    fillet1_2_piece_13b = extrude(amount=55.5, mode=Mode.PRIVATE)
    fillet1_2_piece_13b = split(fillet1_2_piece_13b, bisect_by=Plane(origin=(71.868024429, -5, -4.868024429), z_dir=(0, -1, 0)), keep=Keep.TOP, mode=Mode.PRIVATE)
    fillet1_2_piece_13 = fillet1_2_piece_13a & fillet1_2_piece_13b
    add(fillet1_2_piece_13, mode=Mode.SUBTRACT)
    with BuildSketch(Plane(origin=(73, 7.5, -19.5), x_dir=(0, 0, 1), z_dir=(0, -1, 0))) as fillet1_2_piece_14a_section:
        with BuildLine():
            CenterArc((FILLET1_R, FILLET1_R), FILLET1_R, 180, 90)
            Line((0, FILLET1_R), (-FILLET1_R * 0.02, FILLET1_R))
            Line((-FILLET1_R * 0.02, FILLET1_R), (-FILLET1_R * 0.02, -FILLET1_R * 0.02))
            Line((-FILLET1_R * 0.02, -FILLET1_R * 0.02), (FILLET1_R, -FILLET1_R * 0.02))
            Line((FILLET1_R, -FILLET1_R * 0.02), (FILLET1_R, 0))
        make_face()
    fillet1_2_piece_14a = extrude(amount=29.5, mode=Mode.PRIVATE)
    fillet1_2_piece_14a = split(fillet1_2_piece_14a, bisect_by=Plane(origin=(71.868024429, -5, -18.368024429), z_dir=(0, 1, 0)), keep=Keep.TOP, mode=Mode.PRIVATE)
    with BuildSketch(Plane(origin=(73, -5, -6), x_dir=(0, -1, 0), z_dir=(0, 0, -1))) as fillet1_2_piece_14b_section:
        with BuildLine():
            CenterArc((FILLET1_R, FILLET1_R), FILLET1_R, 180, 90)
            Line((0, FILLET1_R), (-FILLET1_R * 0.02, FILLET1_R))
            Line((-FILLET1_R * 0.02, FILLET1_R), (-FILLET1_R * 0.02, -FILLET1_R * 0.02))
            Line((-FILLET1_R * 0.02, -FILLET1_R * 0.02), (FILLET1_R, -FILLET1_R * 0.02))
            Line((FILLET1_R, -FILLET1_R * 0.02), (FILLET1_R, 0))
        make_face()
    fillet1_2_piece_14b = extrude(amount=26, mode=Mode.PRIVATE)
    fillet1_2_piece_14b = split(fillet1_2_piece_14b, bisect_by=Plane(origin=(71.868024429, -6.131975571, -19.5), z_dir=(0, 0, -1)), keep=Keep.TOP, mode=Mode.PRIVATE)
    fillet1_2_piece_14 = fillet1_2_piece_14a & fillet1_2_piece_14b
    add(fillet1_2_piece_14, mode=Mode.SUBTRACT)
    with BuildSketch(Plane(origin=(73, -5, -23), x_dir=(0, -1, 0), z_dir=(0, 0, -1))) as fillet1_2_piece_15a_section:
        with BuildLine():
            CenterArc((FILLET1_R, FILLET1_R), FILLET1_R, 180, 90)
            Line((0, FILLET1_R), (-FILLET1_R * 0.02, FILLET1_R))
            Line((-FILLET1_R * 0.02, FILLET1_R), (-FILLET1_R * 0.02, -FILLET1_R * 0.02))
            Line((-FILLET1_R * 0.02, -FILLET1_R * 0.02), (FILLET1_R, -FILLET1_R * 0.02))
            Line((FILLET1_R, -FILLET1_R * 0.02), (FILLET1_R, 0))
        make_face()
    fillet1_2_piece_15a = extrude(amount=26, mode=Mode.PRIVATE)
    fillet1_2_piece_15a = split(fillet1_2_piece_15a, bisect_by=Plane(origin=(71.868024429, -6.131975571, -35.5), z_dir=(0, 0, 1)), keep=Keep.TOP, mode=Mode.PRIVATE)
    with BuildSketch(Plane(origin=(73, -22, -35.5), x_dir=(0, 0, -1), z_dir=(0, 1, 0))) as fillet1_2_piece_15b_section:
        with BuildLine():
            CenterArc((FILLET1_R, FILLET1_R), FILLET1_R, 180, 90)
            Line((0, FILLET1_R), (-FILLET1_R * 0.02, FILLET1_R))
            Line((-FILLET1_R * 0.02, FILLET1_R), (-FILLET1_R * 0.02, -FILLET1_R * 0.02))
            Line((-FILLET1_R * 0.02, -FILLET1_R * 0.02), (FILLET1_R, -FILLET1_R * 0.02))
            Line((FILLET1_R, -FILLET1_R * 0.02), (FILLET1_R, 0))
        make_face()
    fillet1_2_piece_15b = extrude(amount=29.5, mode=Mode.PRIVATE)
    fillet1_2_piece_15b = split(fillet1_2_piece_15b, bisect_by=Plane(origin=(71.868024429, -5, -36.631975571), z_dir=(0, 1, 0)), keep=Keep.TOP, mode=Mode.PRIVATE)
    fillet1_2_piece_15 = fillet1_2_piece_15a & fillet1_2_piece_15b
    add(fillet1_2_piece_15, mode=Mode.SUBTRACT)

    # Fillet2
    fillet2_edges = [part.edges().sort_by_distance(p)[0] for p in [
        (33, 16.5, 20),
        (16.5, 33, 20),
        (0, 16.5, 20),
        (16.5, 0, 20),
    ]]
    fillet(fillet2_edges, radius=FILLET2_R)


solid = part.part
